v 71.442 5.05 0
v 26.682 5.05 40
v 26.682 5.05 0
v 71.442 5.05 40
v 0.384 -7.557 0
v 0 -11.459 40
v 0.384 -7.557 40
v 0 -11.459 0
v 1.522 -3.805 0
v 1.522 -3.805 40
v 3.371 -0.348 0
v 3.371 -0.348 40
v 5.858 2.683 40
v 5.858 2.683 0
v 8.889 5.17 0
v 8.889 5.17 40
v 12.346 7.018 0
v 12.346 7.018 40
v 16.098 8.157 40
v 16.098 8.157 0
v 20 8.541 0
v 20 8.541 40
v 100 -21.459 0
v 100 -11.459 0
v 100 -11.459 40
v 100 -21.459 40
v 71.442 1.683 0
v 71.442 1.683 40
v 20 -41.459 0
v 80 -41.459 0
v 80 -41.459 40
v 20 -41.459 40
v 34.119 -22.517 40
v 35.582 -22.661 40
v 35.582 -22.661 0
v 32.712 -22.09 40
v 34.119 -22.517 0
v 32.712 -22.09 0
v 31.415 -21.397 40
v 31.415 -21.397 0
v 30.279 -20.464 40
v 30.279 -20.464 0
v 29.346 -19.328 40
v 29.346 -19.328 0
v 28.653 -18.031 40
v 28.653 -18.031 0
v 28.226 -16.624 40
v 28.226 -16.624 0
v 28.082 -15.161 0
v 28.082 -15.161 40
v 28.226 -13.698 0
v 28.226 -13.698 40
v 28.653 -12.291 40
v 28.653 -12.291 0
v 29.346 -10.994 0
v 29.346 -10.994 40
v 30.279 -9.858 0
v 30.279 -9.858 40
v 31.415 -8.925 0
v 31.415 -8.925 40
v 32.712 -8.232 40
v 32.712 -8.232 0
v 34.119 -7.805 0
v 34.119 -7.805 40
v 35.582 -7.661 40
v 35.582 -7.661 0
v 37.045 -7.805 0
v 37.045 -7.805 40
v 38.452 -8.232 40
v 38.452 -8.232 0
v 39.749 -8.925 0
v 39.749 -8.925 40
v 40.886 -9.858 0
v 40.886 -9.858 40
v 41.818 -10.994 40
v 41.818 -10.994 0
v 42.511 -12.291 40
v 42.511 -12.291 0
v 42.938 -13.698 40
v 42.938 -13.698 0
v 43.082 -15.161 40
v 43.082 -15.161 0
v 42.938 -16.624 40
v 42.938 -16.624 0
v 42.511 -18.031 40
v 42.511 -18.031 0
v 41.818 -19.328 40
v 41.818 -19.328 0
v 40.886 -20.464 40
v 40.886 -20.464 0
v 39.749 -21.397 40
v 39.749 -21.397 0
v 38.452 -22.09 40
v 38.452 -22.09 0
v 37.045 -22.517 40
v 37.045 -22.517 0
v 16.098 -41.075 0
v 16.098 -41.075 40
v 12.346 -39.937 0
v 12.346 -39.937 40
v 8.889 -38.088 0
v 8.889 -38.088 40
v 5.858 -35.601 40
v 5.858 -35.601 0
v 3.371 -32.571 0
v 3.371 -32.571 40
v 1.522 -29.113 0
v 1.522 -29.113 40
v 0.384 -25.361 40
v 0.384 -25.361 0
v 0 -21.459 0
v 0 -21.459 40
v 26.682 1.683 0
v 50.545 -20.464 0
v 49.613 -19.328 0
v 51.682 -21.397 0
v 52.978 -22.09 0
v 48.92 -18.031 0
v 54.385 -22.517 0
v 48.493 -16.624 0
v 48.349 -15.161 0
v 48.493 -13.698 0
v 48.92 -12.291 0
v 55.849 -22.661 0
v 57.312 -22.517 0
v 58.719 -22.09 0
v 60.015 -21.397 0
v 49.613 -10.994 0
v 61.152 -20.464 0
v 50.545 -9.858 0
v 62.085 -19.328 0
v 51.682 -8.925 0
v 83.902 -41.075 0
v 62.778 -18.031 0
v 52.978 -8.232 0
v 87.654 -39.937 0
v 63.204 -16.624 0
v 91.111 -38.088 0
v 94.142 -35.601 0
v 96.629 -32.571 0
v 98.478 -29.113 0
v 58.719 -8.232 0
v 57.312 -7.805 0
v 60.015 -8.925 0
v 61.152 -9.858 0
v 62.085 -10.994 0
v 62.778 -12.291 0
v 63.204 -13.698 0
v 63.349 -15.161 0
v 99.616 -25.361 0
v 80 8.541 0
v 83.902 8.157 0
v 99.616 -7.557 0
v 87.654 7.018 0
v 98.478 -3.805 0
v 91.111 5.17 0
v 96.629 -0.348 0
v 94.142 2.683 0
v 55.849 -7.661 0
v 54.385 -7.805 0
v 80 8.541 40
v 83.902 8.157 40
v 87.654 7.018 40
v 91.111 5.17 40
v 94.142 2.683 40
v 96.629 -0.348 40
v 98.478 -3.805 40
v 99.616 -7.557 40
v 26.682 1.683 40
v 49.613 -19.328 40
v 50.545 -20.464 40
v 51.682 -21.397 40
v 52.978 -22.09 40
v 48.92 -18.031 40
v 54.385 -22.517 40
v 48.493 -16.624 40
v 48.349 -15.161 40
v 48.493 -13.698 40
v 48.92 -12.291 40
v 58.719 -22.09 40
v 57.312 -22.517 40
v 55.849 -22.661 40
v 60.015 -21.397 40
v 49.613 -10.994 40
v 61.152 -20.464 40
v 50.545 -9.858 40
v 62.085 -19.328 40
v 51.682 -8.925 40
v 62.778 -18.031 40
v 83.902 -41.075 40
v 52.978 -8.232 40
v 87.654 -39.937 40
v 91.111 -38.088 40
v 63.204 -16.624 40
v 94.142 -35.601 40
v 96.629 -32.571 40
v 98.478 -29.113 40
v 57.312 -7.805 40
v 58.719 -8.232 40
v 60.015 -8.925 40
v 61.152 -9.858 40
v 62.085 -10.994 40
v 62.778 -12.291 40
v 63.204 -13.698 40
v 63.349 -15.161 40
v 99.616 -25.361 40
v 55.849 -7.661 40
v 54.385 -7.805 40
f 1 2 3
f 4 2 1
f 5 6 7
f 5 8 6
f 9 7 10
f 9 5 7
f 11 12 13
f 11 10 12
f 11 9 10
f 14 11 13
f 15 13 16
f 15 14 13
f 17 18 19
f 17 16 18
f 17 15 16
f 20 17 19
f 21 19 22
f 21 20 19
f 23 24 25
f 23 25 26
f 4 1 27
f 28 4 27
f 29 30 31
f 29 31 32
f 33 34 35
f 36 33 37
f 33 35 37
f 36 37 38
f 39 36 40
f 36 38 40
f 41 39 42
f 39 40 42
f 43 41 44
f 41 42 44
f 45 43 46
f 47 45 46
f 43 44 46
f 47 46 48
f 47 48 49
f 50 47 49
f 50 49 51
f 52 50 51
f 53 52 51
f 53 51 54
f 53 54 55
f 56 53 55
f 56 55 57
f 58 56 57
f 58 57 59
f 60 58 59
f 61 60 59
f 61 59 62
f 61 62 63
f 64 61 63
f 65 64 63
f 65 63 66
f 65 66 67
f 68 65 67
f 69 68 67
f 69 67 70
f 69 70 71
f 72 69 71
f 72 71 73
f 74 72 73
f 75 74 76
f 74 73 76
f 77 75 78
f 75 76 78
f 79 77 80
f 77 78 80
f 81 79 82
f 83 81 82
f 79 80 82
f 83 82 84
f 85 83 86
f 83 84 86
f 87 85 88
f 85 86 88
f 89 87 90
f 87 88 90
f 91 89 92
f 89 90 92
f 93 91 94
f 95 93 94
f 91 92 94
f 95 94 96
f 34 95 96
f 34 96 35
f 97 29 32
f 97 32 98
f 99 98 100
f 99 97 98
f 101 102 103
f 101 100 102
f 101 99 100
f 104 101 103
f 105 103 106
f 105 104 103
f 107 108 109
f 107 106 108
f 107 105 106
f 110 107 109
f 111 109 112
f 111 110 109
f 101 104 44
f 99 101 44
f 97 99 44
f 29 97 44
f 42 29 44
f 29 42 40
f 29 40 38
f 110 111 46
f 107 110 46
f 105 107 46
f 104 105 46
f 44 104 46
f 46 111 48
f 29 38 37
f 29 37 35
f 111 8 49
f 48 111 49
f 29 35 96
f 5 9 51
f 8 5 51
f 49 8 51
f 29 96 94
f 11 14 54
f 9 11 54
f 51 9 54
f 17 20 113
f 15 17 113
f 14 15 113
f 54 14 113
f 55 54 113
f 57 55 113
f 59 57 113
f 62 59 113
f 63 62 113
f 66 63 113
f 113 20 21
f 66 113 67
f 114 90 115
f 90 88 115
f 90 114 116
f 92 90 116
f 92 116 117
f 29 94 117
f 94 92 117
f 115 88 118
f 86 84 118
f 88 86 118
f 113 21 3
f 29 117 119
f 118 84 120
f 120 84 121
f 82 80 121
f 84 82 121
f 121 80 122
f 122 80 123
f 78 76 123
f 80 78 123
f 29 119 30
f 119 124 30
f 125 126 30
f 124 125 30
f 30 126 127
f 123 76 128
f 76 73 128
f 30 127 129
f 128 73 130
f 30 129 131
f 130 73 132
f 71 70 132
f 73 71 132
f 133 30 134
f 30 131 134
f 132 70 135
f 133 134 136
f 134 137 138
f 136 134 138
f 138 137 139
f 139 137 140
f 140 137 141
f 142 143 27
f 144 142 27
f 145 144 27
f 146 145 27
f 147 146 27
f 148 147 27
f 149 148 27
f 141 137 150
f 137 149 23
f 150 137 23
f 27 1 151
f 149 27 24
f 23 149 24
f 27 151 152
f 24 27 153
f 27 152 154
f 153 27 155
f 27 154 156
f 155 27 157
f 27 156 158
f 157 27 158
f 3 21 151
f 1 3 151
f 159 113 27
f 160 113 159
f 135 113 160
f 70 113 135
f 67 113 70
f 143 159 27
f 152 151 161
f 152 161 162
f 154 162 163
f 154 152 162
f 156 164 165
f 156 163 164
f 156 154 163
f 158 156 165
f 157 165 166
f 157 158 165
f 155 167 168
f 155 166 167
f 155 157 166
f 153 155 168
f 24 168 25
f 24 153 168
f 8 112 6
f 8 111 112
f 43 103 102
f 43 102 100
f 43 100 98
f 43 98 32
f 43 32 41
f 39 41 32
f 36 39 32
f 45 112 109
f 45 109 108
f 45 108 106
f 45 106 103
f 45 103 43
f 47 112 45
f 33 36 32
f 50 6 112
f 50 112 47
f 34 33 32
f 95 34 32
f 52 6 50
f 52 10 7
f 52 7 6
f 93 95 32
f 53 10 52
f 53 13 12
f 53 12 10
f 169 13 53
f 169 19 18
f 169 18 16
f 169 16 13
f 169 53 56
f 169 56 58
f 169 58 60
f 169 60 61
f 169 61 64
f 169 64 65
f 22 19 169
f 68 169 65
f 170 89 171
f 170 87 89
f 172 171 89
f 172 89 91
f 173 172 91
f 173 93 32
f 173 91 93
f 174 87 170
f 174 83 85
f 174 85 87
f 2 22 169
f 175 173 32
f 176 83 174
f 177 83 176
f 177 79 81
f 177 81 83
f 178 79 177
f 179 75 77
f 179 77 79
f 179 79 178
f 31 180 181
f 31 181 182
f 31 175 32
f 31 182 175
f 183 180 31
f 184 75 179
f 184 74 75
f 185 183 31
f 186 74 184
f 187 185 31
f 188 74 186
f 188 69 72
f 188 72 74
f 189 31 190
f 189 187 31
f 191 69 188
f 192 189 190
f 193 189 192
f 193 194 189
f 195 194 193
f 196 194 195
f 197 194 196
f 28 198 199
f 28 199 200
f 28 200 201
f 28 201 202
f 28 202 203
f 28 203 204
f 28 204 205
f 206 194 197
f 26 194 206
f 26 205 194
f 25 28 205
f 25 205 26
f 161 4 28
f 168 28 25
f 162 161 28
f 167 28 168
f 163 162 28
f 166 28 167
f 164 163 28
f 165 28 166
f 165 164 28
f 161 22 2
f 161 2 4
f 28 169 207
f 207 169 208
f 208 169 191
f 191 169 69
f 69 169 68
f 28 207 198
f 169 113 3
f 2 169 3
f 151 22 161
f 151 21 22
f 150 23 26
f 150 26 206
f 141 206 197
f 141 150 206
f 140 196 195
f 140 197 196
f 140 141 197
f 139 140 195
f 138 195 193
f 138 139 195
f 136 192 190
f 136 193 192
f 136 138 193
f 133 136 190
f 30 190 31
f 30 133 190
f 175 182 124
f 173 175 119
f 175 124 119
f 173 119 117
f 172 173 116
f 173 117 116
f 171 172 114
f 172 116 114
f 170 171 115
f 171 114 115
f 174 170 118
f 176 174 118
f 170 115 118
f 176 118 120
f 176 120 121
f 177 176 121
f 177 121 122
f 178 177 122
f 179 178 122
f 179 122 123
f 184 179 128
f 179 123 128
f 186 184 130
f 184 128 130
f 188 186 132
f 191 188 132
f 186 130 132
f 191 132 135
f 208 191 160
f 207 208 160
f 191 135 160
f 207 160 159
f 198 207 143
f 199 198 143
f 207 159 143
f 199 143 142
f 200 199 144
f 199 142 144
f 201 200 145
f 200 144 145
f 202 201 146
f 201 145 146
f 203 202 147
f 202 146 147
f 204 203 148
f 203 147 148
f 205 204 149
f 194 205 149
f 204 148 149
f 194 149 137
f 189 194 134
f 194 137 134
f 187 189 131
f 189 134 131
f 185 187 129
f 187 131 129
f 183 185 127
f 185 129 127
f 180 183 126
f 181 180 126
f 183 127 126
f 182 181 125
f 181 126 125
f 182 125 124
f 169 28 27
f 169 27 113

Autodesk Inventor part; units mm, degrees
ref_plane "YZ Plane" through (0, 0, 0) normal (1, 0, 0) x (0, 1, 0)
ref_plane "XZ Plane" through (0, 0, 0) normal (0, 1, 0) x (-1, 0, 0)
ref_plane "XY Plane" through (0, 0, 0) normal (0, 0, 1) x (1, 0, 0)
sketch "Sketch1" plane through (0, 0, 0) normal (0, 0, 1) x (1, 0, 0)
  line L0 (20, 8.5409) -> (80, 8.5409)
  line L1 (100, -11.4591) -> (100, -21.4591)
  line L2 (80, -41.4591) -> (20, -41.4591)
  line L3 (0, -21.4591) -> (0, -11.4591)
  arc A0 (20, 8.5409) -> (0, -11.4591) centre (20, -11.4591) ccw
  arc A1 (100, -11.4591) -> (80, 8.5409) centre (80, -11.4591) ccw
  arc A2 (80, -41.4591) -> (100, -21.4591) centre (80, -21.4591) ccw
  arc A3 (0, -21.4591) -> (20, -41.4591) centre (20, -21.4591) ccw
  point P0 (0, 0)
  point P1 (100, -41.4591)
  point P2 (100, 8.5409)
  point P3 (0, -41.4591)
  dimension "d0" = 100
  dimension "d1" = 50
  dimension "d2" = 20
extrude "Extrusion1" add sketch "Sketch1" along normal blind 40
sketch "Sketch3" plane through (0, 0, 40) normal (0, 0, 1) x (1, 0, 0)
  line L0 (26.6816, 5.0495) -> (71.4417, 5.0495)
  line L1 (71.4417, 5.0495) -> (71.4417, 1.6832)
  line L2 (71.4417, 1.6832) -> (26.6816, 1.6832)
  line L3 (26.6816, 1.6832) -> (26.6816, 5.0495)
  point P0 (0, 0)
extrude "Extrusion2" cut sketch "Sketch3" against normal blind 40
sketch "Sketch4" plane through (0, 0, 40) normal (0, 0, 1) x (1, 0, 0)
  circle A0 centre (35.5822, -15.1611) radius 7.5
  circle A1 centre (55.8486, -15.1611) radius 7.5
  point P0 (0, 0)
  dimension "d16" = 15
  dimension "d17" = 15
hole "Hole2" at (35.5822, -15.1611, 40) at (55.8486, -15.1611, 40) direction (0, 0, -1) diameter 15 end through all
properties part number "head"
